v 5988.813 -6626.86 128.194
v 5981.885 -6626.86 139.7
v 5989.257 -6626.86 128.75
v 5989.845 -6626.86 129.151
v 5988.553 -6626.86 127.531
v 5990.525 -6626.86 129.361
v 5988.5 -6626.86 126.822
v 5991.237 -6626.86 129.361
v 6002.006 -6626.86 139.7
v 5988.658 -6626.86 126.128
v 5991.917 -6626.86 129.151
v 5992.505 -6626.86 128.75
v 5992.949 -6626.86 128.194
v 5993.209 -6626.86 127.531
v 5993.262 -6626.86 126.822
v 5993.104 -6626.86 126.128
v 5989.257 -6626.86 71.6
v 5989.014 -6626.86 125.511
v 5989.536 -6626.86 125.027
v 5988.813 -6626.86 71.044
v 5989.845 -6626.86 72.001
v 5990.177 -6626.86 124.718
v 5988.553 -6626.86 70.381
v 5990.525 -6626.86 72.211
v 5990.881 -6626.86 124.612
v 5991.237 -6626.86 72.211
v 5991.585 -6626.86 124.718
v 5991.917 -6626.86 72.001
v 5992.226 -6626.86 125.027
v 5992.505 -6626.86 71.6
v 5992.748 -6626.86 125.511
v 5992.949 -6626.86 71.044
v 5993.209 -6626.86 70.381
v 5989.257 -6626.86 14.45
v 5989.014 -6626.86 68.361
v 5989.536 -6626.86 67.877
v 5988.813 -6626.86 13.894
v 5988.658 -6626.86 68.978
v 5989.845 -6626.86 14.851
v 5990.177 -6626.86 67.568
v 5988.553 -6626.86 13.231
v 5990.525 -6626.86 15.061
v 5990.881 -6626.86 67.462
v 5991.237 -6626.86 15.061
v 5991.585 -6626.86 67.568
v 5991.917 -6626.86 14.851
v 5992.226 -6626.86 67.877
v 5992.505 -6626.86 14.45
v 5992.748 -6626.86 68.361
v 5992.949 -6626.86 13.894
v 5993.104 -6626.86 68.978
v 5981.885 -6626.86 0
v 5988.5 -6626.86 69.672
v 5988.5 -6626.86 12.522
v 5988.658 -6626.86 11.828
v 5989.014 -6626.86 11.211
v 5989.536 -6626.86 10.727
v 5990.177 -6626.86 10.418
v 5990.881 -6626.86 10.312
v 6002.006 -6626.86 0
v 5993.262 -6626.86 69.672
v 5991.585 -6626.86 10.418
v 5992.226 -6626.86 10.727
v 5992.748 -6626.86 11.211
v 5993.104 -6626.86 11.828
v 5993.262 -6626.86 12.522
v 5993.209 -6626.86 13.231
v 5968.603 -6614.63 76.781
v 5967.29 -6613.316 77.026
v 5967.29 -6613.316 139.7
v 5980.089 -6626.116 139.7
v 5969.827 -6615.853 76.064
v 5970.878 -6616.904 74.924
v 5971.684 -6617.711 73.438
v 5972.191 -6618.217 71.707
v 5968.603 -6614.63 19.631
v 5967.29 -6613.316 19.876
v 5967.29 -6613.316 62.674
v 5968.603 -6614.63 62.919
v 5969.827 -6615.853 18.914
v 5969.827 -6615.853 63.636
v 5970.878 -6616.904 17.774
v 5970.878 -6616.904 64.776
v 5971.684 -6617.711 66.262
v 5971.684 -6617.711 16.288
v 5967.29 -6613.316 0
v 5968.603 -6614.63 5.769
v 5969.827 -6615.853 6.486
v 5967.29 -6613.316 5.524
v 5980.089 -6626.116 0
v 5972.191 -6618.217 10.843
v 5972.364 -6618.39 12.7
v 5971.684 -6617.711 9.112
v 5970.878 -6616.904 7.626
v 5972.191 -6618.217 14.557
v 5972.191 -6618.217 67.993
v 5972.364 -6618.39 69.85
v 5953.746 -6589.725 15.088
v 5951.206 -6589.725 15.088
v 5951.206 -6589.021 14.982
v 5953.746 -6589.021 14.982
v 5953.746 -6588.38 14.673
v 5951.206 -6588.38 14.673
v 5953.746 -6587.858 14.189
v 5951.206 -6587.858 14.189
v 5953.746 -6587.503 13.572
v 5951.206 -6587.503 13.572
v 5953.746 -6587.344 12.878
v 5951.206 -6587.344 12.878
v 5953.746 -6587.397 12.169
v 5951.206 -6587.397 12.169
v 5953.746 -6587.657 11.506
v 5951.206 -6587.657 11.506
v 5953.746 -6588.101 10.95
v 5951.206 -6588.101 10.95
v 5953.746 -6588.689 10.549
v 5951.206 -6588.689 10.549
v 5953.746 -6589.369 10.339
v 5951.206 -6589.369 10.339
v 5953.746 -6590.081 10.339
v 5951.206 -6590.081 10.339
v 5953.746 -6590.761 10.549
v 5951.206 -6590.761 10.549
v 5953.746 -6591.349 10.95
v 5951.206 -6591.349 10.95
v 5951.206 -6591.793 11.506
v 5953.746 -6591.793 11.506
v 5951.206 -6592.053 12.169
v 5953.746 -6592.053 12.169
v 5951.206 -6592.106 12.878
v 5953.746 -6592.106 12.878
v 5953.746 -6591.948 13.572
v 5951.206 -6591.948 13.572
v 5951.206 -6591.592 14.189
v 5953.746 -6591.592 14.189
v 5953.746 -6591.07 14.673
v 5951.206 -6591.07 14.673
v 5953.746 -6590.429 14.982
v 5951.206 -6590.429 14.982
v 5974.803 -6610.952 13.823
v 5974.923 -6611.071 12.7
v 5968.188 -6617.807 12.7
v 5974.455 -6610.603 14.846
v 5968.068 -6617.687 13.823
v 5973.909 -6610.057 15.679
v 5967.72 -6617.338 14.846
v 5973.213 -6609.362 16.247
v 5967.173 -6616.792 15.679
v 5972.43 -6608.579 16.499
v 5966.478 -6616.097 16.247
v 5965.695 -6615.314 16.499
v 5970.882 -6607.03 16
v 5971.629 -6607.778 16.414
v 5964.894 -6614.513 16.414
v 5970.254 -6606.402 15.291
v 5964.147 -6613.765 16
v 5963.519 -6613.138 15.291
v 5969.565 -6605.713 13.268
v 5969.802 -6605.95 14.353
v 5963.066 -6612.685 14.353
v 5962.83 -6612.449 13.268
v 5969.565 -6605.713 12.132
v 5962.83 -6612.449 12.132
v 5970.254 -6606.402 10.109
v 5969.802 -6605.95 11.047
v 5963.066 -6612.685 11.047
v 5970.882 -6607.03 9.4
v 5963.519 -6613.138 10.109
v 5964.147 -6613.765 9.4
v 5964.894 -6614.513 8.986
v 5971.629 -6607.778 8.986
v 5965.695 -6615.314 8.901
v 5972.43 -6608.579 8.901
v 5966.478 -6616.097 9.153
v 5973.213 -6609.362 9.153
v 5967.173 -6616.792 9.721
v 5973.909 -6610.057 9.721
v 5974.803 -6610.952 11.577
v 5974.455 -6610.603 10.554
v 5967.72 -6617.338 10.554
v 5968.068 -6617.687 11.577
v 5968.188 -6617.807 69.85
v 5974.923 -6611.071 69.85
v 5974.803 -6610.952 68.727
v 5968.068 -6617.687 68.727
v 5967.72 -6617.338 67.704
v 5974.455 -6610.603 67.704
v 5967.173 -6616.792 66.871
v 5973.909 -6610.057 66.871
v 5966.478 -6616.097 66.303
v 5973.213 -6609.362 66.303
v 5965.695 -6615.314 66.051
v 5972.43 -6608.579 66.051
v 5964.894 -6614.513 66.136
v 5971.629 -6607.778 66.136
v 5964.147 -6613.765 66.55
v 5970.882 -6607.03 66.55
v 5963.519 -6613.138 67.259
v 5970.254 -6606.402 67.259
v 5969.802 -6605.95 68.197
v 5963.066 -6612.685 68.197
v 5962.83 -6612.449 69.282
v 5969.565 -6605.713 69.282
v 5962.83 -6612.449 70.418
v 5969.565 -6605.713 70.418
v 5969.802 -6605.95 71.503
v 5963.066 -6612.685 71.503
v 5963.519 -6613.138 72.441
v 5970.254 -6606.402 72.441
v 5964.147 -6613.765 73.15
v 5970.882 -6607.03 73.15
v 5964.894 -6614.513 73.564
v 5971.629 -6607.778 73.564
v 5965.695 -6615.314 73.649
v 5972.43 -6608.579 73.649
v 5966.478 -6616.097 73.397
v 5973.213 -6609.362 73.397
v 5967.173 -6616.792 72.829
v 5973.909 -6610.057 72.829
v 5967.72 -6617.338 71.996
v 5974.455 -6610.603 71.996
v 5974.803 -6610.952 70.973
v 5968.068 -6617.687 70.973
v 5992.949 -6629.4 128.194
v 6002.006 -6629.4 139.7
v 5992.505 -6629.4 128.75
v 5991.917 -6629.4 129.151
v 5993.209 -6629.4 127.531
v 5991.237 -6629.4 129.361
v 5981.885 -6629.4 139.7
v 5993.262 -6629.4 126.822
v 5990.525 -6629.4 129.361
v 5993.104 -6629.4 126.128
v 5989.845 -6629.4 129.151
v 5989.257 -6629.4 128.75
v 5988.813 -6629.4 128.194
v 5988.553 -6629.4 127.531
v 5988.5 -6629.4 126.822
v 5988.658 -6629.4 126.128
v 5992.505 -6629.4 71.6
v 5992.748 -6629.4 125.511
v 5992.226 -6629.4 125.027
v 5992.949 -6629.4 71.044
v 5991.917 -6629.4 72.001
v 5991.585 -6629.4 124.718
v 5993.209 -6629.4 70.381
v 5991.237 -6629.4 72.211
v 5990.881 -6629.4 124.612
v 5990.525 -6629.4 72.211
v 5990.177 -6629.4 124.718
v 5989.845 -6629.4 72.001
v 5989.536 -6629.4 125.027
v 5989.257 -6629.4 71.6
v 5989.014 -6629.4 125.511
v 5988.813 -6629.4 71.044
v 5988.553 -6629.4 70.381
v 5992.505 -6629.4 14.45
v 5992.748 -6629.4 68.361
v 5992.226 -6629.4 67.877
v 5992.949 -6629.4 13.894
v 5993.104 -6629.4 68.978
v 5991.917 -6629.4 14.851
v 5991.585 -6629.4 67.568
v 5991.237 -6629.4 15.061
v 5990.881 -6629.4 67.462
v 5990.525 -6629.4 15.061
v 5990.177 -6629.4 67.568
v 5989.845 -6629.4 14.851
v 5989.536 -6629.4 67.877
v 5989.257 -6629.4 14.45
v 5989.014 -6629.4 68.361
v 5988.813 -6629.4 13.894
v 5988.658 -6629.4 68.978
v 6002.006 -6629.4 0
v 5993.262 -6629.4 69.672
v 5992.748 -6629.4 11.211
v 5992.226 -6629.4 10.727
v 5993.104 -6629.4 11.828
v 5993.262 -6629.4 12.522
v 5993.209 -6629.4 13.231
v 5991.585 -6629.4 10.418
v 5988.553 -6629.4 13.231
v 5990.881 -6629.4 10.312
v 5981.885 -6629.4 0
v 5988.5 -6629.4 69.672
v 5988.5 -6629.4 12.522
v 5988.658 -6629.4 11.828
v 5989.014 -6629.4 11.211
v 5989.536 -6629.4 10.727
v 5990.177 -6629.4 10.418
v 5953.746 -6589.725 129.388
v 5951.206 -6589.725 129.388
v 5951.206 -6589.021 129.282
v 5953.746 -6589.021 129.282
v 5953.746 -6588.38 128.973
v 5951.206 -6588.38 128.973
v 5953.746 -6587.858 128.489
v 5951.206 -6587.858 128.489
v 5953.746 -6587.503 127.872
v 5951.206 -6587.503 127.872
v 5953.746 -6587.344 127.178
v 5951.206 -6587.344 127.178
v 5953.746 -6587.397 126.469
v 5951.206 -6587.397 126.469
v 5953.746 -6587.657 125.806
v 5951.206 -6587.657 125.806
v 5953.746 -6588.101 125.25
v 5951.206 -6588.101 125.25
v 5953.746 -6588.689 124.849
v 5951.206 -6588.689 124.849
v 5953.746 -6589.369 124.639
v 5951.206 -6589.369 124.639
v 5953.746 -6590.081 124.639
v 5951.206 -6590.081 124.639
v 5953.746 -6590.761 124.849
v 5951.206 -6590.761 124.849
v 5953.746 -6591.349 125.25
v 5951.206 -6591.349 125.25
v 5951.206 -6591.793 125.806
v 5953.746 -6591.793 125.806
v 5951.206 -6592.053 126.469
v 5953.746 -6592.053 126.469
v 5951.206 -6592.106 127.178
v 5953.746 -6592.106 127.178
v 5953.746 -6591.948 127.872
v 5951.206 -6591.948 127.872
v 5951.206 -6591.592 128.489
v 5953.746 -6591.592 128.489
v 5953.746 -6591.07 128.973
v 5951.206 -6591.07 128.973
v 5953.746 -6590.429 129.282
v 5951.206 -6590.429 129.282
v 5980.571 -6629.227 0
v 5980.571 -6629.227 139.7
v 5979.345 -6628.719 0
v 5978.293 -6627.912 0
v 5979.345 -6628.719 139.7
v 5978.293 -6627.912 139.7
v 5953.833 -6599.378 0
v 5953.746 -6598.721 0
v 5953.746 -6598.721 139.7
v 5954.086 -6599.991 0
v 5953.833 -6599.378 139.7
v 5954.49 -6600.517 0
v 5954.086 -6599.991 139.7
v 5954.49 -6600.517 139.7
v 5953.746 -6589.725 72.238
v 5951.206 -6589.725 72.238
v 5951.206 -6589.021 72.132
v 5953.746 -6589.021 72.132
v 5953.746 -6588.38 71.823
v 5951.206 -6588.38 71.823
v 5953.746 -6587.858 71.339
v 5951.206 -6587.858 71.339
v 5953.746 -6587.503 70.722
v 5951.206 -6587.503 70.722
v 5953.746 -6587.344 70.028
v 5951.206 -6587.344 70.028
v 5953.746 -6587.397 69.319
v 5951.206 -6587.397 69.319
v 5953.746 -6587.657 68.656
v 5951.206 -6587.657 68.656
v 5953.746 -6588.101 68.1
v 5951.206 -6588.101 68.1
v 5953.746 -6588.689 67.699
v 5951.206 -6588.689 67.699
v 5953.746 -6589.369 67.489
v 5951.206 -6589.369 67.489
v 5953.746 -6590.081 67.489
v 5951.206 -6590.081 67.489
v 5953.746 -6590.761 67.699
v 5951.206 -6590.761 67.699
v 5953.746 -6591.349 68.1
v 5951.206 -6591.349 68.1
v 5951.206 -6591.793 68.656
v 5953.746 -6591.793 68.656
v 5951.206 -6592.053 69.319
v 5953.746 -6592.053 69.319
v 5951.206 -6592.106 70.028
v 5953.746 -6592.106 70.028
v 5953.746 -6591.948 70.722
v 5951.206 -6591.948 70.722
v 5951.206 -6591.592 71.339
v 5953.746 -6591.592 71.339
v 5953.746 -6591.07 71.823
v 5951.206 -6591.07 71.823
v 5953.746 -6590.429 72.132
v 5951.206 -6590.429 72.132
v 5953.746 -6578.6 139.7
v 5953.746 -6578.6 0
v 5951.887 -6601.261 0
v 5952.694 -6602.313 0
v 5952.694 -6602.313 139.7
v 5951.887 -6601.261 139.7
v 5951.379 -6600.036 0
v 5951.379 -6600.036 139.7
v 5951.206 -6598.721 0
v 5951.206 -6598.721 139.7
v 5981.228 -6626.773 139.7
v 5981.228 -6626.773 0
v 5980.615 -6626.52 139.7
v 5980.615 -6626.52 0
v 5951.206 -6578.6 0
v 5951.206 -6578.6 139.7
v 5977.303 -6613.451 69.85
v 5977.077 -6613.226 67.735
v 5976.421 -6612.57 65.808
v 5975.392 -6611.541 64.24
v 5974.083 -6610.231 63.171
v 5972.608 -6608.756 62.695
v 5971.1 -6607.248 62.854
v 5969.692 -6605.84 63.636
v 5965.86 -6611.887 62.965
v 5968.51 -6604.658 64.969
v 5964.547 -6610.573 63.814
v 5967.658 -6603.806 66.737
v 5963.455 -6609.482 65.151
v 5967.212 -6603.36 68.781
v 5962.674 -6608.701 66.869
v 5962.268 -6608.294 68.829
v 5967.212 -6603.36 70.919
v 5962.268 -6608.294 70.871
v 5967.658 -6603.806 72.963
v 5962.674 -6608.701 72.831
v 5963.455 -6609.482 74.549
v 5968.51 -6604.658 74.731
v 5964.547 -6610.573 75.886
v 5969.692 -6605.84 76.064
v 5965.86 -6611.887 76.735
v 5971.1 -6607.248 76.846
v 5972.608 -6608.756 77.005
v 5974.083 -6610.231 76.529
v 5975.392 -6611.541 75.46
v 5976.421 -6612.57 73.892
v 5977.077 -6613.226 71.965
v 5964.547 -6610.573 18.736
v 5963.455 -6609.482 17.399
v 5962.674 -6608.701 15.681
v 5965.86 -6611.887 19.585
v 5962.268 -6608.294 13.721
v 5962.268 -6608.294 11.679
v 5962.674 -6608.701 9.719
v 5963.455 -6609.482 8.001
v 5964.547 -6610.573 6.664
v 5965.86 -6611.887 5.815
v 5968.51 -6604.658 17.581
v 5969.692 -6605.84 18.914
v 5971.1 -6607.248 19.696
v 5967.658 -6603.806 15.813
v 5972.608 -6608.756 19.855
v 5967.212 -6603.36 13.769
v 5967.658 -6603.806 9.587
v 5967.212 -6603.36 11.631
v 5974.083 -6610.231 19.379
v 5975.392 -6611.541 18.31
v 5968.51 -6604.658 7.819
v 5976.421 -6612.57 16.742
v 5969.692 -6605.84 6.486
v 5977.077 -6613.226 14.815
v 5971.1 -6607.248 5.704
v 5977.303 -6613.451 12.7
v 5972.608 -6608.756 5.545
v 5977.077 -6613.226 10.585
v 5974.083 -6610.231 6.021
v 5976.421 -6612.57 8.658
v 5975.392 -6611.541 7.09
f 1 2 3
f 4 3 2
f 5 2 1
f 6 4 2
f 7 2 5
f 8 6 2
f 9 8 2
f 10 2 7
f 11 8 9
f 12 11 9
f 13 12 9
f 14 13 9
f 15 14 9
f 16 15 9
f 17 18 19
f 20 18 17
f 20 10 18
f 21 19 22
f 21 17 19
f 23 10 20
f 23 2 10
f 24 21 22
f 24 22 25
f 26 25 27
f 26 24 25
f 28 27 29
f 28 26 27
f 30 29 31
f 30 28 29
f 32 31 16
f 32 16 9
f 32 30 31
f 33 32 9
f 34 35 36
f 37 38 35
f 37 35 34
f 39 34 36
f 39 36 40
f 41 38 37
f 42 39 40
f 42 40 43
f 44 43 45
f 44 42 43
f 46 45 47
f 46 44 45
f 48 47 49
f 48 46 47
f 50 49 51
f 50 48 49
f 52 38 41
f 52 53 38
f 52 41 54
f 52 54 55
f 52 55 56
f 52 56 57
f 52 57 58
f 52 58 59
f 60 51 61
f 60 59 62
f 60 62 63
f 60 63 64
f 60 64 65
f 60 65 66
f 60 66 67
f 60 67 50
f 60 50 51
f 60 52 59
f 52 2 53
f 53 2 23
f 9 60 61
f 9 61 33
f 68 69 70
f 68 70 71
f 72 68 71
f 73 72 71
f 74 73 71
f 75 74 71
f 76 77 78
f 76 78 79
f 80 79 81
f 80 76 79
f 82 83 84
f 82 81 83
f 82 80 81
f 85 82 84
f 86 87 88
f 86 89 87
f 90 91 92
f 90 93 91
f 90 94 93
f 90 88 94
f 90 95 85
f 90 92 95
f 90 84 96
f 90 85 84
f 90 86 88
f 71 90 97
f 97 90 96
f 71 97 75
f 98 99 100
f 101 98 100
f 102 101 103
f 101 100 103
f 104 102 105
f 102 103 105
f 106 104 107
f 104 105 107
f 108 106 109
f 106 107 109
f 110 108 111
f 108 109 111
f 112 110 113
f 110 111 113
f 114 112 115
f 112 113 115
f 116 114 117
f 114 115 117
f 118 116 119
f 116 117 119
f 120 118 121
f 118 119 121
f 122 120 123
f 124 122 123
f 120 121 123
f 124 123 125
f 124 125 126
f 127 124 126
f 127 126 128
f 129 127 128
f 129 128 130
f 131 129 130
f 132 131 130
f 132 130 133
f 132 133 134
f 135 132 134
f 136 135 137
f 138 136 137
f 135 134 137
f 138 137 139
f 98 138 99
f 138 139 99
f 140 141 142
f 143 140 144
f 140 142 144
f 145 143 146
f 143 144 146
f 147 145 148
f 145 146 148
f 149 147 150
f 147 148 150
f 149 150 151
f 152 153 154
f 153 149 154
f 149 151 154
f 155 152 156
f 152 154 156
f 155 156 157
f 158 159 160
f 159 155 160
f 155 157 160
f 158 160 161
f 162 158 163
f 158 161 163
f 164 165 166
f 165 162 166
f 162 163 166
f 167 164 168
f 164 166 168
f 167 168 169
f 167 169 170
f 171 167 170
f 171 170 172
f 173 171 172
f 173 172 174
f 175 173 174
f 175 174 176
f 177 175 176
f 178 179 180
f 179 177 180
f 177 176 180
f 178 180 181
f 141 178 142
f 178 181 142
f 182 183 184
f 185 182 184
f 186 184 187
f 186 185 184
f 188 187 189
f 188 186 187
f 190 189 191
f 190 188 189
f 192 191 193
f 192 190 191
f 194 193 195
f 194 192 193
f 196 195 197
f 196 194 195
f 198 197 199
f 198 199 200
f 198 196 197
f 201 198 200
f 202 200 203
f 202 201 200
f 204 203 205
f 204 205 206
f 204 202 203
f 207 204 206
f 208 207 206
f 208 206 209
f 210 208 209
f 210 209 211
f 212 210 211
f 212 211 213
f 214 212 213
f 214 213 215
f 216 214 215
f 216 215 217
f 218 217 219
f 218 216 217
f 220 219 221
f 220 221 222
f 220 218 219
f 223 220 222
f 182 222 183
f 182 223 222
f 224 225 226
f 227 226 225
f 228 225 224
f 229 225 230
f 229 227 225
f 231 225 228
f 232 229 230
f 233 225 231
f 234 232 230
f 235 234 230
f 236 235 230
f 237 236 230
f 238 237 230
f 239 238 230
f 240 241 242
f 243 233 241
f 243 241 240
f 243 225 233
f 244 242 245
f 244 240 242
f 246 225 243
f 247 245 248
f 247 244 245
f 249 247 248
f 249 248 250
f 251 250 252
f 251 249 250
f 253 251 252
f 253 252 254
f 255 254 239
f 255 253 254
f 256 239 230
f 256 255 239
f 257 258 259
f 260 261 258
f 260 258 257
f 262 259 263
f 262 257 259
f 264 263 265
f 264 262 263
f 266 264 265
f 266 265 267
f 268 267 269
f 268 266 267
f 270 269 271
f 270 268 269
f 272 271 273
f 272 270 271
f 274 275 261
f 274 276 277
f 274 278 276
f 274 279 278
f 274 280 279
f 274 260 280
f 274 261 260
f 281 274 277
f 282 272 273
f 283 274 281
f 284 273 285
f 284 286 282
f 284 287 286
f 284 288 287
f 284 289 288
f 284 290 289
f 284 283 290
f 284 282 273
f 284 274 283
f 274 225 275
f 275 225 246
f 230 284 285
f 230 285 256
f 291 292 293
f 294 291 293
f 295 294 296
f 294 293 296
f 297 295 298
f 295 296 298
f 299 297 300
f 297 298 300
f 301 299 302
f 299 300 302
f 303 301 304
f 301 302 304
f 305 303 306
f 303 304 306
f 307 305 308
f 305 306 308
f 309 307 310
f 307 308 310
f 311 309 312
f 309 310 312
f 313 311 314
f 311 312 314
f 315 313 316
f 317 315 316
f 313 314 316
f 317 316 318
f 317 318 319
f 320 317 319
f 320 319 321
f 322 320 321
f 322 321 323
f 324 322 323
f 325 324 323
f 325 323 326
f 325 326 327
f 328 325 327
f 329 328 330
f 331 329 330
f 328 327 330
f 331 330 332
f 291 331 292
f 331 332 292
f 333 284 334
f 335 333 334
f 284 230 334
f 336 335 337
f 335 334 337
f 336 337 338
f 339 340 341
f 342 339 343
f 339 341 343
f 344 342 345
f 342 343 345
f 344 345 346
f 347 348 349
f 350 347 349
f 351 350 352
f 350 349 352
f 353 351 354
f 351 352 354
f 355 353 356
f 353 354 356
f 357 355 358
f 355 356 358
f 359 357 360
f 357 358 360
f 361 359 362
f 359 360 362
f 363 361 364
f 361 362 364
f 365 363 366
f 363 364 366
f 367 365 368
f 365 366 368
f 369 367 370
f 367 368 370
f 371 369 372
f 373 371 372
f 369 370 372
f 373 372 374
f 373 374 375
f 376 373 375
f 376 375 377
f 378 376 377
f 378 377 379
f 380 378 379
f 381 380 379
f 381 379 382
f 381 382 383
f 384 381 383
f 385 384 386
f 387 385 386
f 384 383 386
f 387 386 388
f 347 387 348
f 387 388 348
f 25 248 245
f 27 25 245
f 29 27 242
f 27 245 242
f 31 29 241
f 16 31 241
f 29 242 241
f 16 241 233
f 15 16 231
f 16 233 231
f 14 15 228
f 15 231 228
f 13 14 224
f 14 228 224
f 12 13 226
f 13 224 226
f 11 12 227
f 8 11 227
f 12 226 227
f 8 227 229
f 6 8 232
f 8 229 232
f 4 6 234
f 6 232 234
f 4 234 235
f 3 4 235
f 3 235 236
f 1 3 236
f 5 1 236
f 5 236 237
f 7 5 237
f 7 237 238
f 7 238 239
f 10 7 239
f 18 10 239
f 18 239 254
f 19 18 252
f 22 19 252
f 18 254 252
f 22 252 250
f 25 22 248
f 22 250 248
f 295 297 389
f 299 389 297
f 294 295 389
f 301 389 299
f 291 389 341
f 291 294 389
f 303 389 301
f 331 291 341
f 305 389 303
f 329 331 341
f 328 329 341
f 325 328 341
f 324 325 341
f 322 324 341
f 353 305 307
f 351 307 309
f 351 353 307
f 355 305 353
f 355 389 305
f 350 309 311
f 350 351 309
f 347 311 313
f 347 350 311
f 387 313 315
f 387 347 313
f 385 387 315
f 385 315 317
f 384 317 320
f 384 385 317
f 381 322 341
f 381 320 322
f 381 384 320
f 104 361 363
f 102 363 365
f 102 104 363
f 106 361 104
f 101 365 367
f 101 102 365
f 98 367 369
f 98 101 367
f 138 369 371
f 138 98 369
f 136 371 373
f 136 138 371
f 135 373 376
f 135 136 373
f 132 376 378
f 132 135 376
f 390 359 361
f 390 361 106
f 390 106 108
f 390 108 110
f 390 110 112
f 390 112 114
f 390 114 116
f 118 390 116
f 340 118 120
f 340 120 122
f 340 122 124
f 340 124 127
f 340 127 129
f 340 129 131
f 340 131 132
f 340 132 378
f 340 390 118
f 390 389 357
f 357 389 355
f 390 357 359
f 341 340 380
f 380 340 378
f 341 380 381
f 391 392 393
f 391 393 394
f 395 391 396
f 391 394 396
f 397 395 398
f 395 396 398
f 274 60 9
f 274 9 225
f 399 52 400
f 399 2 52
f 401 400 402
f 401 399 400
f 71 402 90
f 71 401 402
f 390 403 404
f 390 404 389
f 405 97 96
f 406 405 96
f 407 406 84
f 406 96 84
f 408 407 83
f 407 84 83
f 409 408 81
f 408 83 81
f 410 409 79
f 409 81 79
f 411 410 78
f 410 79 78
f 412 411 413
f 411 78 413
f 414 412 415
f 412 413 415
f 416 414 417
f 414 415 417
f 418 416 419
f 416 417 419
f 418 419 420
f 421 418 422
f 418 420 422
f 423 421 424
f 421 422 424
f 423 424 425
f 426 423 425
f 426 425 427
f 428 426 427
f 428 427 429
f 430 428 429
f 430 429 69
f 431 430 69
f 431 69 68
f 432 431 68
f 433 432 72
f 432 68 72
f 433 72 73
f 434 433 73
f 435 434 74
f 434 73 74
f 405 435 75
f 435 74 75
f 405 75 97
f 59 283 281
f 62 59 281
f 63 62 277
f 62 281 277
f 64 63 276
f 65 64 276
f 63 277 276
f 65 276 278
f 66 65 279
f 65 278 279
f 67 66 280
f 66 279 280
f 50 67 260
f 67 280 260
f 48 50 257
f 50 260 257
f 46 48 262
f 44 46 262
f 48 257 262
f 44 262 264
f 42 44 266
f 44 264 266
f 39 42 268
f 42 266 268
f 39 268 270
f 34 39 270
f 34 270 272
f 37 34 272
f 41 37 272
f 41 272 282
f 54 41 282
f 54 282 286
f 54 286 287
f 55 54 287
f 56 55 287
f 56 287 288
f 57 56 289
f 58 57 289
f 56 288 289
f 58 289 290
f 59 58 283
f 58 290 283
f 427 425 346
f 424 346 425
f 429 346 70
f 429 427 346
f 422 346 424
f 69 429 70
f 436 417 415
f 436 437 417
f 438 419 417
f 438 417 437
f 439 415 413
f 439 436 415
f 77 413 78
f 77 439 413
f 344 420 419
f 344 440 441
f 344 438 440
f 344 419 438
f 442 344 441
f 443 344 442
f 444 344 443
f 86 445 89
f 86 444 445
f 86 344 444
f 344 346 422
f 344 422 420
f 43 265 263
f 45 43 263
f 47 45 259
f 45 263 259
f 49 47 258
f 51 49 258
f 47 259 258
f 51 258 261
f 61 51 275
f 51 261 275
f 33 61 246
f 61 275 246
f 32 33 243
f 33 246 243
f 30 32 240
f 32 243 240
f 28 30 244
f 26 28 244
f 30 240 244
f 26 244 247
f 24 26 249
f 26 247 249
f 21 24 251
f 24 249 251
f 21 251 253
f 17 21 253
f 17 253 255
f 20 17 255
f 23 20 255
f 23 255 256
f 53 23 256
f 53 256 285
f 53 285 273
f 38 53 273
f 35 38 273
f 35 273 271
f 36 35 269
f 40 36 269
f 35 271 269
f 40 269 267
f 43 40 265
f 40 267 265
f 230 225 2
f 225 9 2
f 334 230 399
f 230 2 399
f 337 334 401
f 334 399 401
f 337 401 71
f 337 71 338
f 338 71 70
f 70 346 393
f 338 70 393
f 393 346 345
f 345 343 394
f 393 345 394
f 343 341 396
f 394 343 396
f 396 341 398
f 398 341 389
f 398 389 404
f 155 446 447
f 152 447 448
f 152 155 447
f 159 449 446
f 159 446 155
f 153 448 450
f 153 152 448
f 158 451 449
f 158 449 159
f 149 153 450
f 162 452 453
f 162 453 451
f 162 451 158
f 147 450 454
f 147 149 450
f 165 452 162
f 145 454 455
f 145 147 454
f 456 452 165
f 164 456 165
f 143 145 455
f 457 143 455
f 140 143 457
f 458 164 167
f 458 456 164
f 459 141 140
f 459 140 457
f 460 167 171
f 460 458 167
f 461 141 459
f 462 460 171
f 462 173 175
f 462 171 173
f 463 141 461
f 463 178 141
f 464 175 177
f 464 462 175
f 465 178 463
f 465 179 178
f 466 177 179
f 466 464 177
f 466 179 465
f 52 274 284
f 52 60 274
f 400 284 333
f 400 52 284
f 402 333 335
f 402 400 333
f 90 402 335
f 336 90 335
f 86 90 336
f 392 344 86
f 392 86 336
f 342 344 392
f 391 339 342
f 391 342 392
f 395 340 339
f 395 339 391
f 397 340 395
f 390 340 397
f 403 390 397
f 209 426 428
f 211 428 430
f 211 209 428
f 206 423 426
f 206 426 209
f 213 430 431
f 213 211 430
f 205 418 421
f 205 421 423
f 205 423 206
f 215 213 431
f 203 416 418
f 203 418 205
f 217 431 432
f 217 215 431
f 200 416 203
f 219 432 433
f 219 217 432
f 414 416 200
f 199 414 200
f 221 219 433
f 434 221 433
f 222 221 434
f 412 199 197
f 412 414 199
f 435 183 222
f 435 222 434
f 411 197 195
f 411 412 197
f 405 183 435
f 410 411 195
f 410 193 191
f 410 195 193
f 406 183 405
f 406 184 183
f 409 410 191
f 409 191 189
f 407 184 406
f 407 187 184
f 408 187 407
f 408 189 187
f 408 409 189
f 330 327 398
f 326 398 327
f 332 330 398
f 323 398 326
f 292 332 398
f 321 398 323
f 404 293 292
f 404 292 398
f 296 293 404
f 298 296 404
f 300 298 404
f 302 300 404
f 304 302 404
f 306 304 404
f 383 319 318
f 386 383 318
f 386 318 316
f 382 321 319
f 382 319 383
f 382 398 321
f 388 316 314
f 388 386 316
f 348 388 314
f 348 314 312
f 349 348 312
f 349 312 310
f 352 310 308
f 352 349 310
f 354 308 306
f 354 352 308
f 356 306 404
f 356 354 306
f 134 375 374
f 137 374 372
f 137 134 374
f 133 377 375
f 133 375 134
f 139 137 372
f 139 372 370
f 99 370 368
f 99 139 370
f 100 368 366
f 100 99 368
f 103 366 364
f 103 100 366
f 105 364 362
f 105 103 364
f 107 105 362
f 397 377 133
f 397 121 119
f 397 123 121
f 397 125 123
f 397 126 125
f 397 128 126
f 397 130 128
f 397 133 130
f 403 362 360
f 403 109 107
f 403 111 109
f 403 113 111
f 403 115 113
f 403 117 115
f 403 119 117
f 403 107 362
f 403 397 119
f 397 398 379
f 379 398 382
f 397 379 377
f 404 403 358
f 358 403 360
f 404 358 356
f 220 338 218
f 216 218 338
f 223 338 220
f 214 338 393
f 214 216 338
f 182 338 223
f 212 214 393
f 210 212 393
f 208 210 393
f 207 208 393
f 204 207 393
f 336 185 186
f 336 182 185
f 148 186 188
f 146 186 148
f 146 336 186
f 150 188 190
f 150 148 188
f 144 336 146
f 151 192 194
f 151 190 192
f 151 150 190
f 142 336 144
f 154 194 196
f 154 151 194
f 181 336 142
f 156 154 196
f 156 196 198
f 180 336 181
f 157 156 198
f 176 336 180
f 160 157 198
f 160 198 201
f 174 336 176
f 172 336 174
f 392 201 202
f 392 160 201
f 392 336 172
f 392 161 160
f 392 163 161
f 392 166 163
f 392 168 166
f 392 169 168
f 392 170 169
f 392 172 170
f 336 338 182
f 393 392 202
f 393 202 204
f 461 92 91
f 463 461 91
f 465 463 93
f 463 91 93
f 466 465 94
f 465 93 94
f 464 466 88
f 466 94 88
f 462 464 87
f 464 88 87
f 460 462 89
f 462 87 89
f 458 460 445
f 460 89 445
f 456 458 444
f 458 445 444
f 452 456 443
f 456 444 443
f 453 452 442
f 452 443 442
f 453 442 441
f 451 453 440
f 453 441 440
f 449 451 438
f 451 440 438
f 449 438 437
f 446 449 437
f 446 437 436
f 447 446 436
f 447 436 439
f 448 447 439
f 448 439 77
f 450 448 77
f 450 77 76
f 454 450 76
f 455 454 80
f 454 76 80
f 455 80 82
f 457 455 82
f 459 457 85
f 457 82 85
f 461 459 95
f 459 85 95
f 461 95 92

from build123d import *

# Parameters (mm, degrees)
EXTRUDE1_DEPTH     = 139.7
SKETCH2_R          = 2.3876
CUT_EXTRUDE1_DEPTH = 2.539999999
SKETCH3_R          = 2.3876
CUT_EXTRUDE2_DEPTH = 2.54
SKETCH4_R          = 3.81
CUT_EXTRUDE3_DEPTH = 2.539999999
SKETCH5_R          = 7.1755
SKETCH5_R_2        = 3.81
EXTRUDE2_DEPTH     = 6.985
FILLET1_R          = 2.54
FILLET2_R          = 5.08


with BuildPart() as part:
    # Sketch1 → Extrude1 (new body)
    with BuildSketch(Plane.XY):
        Polygon((5980.833305588, -6626.860000001), (6002.006203139, -6626.860000001), (6002.006203139, -6629.4), (5979.781203139, -6629.4), (5951.206203139, -6600.825), (5951.206203139, -6578.6), (5953.746203139, -6578.6), (5953.746203139, -6599.772897553), (5967.289754364, -6613.316448778), align=None)
    extrude(amount=EXTRUDE1_DEPTH)

    # Sketch2 → Cut-Extrude1 (cut)
    with BuildSketch(Plane.XZ.offset(6629.4)):
        with Locations(Location((5990.881003139, 127, 0), (0, 0, 270))):
            Circle(SKETCH2_R)
        with Locations(Location((5990.881003139, 69.85, 0), (0, 0, 270))):
            Circle(SKETCH2_R)
        with Locations(Location((5990.881003139, 12.7, 0), (0, 0, 270))):
            Circle(SKETCH2_R)
    extrude(amount=-CUT_EXTRUDE1_DEPTH, mode=Mode.SUBTRACT)

    # Sketch3 → Cut-Extrude2 (cut)
    with BuildSketch(Plane.ZY.offset(-5951.206203139)):
        with Locations((127, -6589.7252)):
            Circle(SKETCH3_R)
        with Locations((69.85, -6589.7252)):
            Circle(SKETCH3_R)
        with Locations((12.7, -6589.7252)):
            Circle(SKETCH3_R)
    extrude(amount=-CUT_EXTRUDE2_DEPTH, mode=Mode.SUBTRACT)

    # Sketch4 → Cut-Extrude3 (cut)
    with BuildSketch(Plane(origin=(-324.80939843, -324.80939843, 0), x_dir=(0, 0, 1), z_dir=(-0.7071067811865477, -0.7071067811865475, 0))):
        with Locations(Location((69.85, -8895.831957677, 0), (0, 0, 270))):
            Circle(SKETCH4_R)
        with Locations(Location((12.7, -8895.831957677, 0), (0, 0, 270))):
            Circle(SKETCH4_R)
    extrude(amount=-CUT_EXTRUDE3_DEPTH, mode=Mode.SUBTRACT)

    # Sketch5 → Extrude2 (add)
    with BuildSketch(Plane(origin=(-323.013347207, -323.013347207, 0), x_dir=(0, 0, -1), z_dir=(0.7071067811865477, 0.7071067811865475, 0))):
        with Locations(Location((-69.85, -8895.831957677, 0), (0, 0, 270))):
            Circle(SKETCH5_R)
        with Locations(Location((-69.85, -8895.831957677, 0), (0, 0, 270))):
            Circle(SKETCH5_R_2, mode=Mode.SUBTRACT)
        with Locations(Location((-12.7, -8895.831957677, 0), (0, 0, 270))):
            Circle(SKETCH5_R)
        with Locations(Location((-12.7, -8895.831957677, 0), (0, 0, 270))):
            Circle(SKETCH5_R_2, mode=Mode.SUBTRACT)
    extrude(amount=EXTRUDE2_DEPTH)

    # Fillet1
    fillet1_edges = [part.edges().sort_by_distance(p)[0] for p in [
        (5980.833305588, -6626.860000001, 69.85),
        (5953.746203139, -6599.772897553, 69.85),
    ]]
    fillet(fillet1_edges, radius=FILLET1_R)

    # Fillet2
    fillet2_edges = [part.edges().sort_by_distance(p)[0] for p in [
        (5979.781203139, -6629.4, 69.85),
        (5951.206203139, -6600.825, 69.85),
    ]]
    fillet(fillet2_edges, radius=FILLET2_R)


solid = part.part
